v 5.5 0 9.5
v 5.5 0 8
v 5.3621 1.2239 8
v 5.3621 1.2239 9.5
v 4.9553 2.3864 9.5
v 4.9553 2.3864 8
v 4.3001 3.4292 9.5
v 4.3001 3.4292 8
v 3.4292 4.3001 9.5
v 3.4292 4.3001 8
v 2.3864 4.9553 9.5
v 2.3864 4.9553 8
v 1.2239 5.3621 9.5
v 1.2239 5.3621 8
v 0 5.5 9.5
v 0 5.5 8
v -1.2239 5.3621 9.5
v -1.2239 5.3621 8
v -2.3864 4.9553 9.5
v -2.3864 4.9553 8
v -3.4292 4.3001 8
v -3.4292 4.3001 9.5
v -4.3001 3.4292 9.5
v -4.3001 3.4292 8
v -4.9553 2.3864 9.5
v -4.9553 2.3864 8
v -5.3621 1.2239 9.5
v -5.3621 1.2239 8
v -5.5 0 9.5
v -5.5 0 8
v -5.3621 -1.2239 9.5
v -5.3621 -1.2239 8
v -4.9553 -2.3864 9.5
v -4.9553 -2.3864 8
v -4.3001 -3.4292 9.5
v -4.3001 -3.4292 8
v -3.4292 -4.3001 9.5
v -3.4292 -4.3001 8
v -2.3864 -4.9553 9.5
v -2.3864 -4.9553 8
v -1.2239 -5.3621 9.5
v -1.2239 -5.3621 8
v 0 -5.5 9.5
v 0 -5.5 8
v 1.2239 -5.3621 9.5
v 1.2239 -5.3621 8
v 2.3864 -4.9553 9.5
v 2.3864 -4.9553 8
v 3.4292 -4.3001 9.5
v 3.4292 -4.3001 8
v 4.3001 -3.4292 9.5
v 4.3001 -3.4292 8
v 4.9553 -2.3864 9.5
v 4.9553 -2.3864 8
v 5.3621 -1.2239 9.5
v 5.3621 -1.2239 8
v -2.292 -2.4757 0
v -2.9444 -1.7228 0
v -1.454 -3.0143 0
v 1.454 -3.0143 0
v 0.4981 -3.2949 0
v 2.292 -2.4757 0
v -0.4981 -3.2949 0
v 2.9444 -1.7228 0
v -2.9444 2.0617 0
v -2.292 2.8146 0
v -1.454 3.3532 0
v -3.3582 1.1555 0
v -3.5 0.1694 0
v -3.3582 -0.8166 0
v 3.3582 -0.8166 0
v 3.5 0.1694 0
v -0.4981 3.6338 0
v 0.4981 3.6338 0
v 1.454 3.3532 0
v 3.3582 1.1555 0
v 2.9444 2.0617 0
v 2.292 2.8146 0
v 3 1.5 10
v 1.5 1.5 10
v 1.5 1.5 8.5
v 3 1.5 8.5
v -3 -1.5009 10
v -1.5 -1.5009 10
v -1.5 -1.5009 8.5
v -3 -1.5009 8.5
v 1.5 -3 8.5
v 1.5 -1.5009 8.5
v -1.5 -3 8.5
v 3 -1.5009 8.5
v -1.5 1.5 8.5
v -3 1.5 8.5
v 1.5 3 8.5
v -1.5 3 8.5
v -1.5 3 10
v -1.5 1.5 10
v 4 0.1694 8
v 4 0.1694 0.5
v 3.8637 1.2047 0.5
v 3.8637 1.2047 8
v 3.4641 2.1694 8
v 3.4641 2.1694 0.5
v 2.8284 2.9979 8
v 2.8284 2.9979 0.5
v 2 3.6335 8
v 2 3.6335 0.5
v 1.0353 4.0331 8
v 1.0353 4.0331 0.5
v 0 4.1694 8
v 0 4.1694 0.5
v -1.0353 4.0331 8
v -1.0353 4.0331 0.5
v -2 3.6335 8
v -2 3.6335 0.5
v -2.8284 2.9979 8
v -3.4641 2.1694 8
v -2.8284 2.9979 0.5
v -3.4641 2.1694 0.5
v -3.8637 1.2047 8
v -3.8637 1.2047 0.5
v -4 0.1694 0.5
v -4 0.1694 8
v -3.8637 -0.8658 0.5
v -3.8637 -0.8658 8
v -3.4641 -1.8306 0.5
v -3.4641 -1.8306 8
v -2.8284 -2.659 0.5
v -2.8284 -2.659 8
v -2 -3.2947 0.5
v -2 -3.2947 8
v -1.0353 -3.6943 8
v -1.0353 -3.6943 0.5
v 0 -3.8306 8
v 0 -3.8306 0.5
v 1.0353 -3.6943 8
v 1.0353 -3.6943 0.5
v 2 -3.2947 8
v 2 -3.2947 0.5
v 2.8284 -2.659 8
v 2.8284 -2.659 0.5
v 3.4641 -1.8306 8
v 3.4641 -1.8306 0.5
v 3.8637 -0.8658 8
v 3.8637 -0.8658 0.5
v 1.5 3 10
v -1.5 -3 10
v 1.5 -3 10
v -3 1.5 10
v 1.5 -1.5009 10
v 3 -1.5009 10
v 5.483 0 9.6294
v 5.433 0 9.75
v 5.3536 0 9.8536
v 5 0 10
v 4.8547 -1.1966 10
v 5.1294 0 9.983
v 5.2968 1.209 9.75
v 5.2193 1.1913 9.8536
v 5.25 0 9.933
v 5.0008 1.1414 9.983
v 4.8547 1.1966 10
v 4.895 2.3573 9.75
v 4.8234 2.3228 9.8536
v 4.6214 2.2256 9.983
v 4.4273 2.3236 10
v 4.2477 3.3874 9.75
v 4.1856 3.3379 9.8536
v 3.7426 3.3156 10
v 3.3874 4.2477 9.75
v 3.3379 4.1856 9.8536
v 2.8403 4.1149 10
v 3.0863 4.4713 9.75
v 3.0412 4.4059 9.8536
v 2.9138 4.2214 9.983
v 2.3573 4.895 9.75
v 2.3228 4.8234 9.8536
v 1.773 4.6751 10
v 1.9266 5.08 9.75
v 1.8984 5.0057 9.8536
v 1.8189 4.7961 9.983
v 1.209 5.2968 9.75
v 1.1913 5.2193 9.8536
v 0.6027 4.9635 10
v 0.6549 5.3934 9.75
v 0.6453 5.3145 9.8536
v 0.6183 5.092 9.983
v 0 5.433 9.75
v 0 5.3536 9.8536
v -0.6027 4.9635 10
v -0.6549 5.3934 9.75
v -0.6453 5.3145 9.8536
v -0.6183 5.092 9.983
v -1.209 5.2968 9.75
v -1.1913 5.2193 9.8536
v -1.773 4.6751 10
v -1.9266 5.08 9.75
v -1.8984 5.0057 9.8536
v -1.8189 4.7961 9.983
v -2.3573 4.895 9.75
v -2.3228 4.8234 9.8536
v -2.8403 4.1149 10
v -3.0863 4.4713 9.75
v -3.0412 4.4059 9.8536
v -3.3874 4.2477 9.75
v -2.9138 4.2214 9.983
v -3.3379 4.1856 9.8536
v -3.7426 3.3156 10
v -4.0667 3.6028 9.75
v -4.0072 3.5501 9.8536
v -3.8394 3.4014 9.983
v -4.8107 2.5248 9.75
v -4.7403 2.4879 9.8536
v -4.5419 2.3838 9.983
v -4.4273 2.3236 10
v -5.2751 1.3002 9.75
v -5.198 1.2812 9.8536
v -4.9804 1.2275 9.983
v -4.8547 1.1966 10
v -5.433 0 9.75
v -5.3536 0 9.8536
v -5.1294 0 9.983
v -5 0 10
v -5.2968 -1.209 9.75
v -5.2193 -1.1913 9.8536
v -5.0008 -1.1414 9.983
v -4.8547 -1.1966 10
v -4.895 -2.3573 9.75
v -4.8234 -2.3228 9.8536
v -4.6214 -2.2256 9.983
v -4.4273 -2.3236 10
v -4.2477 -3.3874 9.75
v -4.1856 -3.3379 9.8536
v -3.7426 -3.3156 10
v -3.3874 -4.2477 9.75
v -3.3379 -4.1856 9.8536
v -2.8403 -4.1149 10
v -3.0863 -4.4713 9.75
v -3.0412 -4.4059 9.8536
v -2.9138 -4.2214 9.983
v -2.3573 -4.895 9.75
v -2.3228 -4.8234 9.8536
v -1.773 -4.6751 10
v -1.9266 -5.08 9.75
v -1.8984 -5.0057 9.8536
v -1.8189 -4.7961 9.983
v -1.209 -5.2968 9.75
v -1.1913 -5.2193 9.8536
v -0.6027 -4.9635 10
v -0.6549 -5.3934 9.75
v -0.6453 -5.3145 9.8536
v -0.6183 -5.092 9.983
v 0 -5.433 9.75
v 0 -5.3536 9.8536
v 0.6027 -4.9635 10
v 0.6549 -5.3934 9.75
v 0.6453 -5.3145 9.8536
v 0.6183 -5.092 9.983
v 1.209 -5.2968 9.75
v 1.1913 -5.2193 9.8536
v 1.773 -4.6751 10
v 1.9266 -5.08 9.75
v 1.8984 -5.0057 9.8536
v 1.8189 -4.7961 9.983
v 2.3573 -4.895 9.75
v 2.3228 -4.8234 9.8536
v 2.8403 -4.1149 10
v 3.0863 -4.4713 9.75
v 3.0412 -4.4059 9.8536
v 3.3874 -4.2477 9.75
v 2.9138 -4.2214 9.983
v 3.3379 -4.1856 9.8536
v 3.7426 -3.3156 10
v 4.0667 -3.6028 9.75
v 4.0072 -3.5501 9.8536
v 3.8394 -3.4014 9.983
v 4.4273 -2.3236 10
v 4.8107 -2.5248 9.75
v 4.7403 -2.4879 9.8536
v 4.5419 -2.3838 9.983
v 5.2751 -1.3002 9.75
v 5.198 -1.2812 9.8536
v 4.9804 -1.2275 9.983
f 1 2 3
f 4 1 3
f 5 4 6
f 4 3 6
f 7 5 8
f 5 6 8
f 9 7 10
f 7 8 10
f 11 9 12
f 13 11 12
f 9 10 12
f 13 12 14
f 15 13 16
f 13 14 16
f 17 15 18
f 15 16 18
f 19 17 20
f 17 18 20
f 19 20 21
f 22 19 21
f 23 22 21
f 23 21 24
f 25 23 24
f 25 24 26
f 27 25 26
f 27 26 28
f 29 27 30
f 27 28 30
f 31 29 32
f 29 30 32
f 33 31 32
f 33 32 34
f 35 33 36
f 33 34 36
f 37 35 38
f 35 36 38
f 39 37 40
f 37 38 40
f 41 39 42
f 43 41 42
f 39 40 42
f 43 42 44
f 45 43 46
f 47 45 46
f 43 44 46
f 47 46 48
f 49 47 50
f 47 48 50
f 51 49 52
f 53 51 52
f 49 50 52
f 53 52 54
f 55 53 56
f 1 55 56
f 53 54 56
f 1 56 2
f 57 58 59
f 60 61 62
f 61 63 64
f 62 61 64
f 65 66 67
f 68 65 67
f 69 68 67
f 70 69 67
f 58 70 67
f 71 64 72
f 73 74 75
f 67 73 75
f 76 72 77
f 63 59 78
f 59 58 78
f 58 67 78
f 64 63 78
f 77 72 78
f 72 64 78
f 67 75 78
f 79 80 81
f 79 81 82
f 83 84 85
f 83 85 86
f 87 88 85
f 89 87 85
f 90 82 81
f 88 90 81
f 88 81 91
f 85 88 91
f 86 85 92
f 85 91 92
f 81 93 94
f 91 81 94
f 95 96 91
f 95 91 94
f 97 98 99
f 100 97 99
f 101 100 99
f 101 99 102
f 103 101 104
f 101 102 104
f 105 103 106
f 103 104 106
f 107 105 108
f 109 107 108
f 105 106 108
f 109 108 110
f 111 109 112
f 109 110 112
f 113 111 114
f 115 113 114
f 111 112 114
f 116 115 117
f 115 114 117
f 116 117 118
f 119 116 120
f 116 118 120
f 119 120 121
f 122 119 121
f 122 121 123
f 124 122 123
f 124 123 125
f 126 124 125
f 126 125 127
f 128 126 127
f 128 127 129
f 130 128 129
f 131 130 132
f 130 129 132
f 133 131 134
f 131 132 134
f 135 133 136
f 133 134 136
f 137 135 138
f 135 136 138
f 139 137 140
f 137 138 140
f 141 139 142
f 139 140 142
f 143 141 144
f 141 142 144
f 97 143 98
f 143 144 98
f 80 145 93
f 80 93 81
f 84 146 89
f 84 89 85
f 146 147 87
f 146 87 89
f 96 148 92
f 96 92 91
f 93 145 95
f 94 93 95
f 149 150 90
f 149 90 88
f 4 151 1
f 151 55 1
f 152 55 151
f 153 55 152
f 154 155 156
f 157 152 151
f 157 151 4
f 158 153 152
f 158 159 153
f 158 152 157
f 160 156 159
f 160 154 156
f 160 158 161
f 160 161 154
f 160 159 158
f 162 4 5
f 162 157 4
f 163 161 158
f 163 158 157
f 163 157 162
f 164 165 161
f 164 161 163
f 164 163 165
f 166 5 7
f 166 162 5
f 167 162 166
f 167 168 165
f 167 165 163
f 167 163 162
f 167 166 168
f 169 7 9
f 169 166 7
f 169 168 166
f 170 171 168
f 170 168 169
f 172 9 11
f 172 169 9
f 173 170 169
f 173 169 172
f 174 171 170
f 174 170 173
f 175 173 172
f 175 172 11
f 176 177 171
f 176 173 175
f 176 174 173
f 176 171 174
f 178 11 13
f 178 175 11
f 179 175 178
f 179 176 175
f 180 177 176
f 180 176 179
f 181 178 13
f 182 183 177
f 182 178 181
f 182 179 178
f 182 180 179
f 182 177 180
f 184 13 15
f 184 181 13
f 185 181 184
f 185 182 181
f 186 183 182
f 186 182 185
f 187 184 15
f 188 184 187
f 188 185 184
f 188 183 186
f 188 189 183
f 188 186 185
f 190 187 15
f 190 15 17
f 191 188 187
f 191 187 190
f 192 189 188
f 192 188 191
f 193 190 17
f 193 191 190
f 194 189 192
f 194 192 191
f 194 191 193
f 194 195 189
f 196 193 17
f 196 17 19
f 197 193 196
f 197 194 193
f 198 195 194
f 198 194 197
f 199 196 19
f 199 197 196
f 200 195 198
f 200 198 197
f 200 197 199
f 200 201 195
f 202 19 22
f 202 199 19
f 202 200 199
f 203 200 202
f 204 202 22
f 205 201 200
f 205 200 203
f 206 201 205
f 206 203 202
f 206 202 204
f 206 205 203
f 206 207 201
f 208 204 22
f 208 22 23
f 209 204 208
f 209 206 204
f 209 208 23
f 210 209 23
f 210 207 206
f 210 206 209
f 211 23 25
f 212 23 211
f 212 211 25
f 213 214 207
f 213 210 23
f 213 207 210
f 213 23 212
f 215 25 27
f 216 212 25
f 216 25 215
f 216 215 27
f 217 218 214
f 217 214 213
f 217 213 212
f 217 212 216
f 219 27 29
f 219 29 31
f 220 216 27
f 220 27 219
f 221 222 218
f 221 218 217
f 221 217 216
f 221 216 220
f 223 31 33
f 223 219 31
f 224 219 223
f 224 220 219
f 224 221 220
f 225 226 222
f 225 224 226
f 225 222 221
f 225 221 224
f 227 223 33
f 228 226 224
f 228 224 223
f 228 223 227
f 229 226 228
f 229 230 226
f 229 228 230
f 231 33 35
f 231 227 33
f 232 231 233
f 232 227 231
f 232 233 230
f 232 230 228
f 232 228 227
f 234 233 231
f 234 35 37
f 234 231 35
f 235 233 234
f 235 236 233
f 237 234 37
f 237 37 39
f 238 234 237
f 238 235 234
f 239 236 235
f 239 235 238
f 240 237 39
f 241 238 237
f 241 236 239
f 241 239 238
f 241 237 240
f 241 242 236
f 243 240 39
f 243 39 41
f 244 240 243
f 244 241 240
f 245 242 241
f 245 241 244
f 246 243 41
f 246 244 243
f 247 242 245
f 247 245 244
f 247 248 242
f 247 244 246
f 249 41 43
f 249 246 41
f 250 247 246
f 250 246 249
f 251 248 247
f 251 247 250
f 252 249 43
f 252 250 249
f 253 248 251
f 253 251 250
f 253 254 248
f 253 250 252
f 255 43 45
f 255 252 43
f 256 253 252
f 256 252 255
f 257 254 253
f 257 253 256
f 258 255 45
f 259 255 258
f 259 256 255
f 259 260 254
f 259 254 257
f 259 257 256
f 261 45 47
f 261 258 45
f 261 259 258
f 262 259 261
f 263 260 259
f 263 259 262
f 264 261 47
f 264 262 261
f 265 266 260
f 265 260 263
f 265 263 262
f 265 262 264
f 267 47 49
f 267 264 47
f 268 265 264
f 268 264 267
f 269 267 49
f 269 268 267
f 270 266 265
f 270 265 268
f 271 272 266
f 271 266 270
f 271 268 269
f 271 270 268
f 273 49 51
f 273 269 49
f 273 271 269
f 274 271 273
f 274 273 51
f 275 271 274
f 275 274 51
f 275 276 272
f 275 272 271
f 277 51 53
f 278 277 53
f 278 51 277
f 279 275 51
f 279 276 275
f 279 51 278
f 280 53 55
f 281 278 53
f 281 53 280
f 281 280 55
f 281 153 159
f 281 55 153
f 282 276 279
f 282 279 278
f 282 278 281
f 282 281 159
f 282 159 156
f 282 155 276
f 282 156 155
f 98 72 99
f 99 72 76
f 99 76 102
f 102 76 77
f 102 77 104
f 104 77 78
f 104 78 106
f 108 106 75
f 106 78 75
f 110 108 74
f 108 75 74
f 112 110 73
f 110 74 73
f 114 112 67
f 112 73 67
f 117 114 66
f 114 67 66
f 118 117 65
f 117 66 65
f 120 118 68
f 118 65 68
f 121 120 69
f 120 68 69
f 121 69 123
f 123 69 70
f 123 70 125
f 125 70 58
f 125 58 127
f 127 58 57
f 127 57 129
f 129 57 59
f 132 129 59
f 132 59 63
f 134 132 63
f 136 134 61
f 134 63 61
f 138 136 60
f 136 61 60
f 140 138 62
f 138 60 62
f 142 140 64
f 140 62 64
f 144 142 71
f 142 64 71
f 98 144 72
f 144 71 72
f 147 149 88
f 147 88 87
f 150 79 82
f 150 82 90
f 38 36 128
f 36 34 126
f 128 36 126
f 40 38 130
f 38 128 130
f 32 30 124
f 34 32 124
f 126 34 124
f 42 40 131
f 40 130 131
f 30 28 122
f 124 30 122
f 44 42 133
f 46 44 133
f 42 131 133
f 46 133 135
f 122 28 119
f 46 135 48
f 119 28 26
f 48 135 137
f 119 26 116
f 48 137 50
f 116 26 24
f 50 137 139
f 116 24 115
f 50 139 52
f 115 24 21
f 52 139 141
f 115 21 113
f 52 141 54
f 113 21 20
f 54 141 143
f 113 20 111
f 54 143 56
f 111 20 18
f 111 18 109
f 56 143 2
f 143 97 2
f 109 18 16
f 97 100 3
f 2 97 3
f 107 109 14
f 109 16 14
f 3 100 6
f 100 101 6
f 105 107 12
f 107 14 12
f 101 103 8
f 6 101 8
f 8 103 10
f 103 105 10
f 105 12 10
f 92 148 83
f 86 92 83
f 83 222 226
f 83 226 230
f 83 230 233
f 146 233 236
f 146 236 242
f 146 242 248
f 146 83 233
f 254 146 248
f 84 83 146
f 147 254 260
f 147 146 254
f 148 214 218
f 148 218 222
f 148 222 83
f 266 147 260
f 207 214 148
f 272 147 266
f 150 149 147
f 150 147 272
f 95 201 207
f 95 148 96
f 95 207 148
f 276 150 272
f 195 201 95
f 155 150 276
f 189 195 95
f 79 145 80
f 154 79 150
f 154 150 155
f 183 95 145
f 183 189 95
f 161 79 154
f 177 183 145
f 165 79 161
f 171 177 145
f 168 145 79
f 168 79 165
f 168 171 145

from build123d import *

# Parameters (mm, degrees)
SKETCH1_R           = 4
BOSS_EXTRUDE1_DEPTH = 8
SKETCH2_R           = 5.5
BOSS_EXTRUDE2_DEPTH = 2
CHAMFER1_SIZE       = 0.5
CUT_EXTRUDE1_DEPTH  = 1.5
FILLET1_R           = 0.5


with BuildPart() as part:
    # Sketch1 → Boss-Extrude1 (new body)
    with BuildSketch(Plane.XY):
        with Locations((0, 0.169439546)):
            Circle(SKETCH1_R)
    extrude(amount=BOSS_EXTRUDE1_DEPTH)

    # Sketch2 → Boss-Extrude2 (add)
    with BuildSketch(Plane.XY.offset(8)):
        Circle(SKETCH2_R)
    extrude(amount=BOSS_EXTRUDE2_DEPTH)

    # Chamfer1
    chamfer1_edges = [part.edges().sort_by_distance(p)[0] for p in [
        (-4, 0.169439546, 0),
    ]]
    chamfer(chamfer1_edges, length=CHAMFER1_SIZE)

    # Sketch4 → Cut-Extrude1 (cut)
    with BuildSketch(Plane.XY.offset(10)):
        Polygon((1.5, 1.5), (3, 1.5), (3, -1.50088727), (1.5, -1.50088727), (1.5, -3), (-1.5, -3), (-1.5, -1.50088727), (-3, -1.50088727), (-3, 0), (-3, 1.5), (-1.5, 1.5), (-1.5, 3), (0, 3), (1.5, 3), align=None)
    extrude(amount=-CUT_EXTRUDE1_DEPTH, mode=Mode.SUBTRACT)

    # Fillet1
    fillet1_edges = [part.edges().sort_by_distance(p)[0] for p in [
        (-5.5, 0, 10),
    ]]
    fillet(fillet1_edges, radius=FILLET1_R)


solid = part.part
